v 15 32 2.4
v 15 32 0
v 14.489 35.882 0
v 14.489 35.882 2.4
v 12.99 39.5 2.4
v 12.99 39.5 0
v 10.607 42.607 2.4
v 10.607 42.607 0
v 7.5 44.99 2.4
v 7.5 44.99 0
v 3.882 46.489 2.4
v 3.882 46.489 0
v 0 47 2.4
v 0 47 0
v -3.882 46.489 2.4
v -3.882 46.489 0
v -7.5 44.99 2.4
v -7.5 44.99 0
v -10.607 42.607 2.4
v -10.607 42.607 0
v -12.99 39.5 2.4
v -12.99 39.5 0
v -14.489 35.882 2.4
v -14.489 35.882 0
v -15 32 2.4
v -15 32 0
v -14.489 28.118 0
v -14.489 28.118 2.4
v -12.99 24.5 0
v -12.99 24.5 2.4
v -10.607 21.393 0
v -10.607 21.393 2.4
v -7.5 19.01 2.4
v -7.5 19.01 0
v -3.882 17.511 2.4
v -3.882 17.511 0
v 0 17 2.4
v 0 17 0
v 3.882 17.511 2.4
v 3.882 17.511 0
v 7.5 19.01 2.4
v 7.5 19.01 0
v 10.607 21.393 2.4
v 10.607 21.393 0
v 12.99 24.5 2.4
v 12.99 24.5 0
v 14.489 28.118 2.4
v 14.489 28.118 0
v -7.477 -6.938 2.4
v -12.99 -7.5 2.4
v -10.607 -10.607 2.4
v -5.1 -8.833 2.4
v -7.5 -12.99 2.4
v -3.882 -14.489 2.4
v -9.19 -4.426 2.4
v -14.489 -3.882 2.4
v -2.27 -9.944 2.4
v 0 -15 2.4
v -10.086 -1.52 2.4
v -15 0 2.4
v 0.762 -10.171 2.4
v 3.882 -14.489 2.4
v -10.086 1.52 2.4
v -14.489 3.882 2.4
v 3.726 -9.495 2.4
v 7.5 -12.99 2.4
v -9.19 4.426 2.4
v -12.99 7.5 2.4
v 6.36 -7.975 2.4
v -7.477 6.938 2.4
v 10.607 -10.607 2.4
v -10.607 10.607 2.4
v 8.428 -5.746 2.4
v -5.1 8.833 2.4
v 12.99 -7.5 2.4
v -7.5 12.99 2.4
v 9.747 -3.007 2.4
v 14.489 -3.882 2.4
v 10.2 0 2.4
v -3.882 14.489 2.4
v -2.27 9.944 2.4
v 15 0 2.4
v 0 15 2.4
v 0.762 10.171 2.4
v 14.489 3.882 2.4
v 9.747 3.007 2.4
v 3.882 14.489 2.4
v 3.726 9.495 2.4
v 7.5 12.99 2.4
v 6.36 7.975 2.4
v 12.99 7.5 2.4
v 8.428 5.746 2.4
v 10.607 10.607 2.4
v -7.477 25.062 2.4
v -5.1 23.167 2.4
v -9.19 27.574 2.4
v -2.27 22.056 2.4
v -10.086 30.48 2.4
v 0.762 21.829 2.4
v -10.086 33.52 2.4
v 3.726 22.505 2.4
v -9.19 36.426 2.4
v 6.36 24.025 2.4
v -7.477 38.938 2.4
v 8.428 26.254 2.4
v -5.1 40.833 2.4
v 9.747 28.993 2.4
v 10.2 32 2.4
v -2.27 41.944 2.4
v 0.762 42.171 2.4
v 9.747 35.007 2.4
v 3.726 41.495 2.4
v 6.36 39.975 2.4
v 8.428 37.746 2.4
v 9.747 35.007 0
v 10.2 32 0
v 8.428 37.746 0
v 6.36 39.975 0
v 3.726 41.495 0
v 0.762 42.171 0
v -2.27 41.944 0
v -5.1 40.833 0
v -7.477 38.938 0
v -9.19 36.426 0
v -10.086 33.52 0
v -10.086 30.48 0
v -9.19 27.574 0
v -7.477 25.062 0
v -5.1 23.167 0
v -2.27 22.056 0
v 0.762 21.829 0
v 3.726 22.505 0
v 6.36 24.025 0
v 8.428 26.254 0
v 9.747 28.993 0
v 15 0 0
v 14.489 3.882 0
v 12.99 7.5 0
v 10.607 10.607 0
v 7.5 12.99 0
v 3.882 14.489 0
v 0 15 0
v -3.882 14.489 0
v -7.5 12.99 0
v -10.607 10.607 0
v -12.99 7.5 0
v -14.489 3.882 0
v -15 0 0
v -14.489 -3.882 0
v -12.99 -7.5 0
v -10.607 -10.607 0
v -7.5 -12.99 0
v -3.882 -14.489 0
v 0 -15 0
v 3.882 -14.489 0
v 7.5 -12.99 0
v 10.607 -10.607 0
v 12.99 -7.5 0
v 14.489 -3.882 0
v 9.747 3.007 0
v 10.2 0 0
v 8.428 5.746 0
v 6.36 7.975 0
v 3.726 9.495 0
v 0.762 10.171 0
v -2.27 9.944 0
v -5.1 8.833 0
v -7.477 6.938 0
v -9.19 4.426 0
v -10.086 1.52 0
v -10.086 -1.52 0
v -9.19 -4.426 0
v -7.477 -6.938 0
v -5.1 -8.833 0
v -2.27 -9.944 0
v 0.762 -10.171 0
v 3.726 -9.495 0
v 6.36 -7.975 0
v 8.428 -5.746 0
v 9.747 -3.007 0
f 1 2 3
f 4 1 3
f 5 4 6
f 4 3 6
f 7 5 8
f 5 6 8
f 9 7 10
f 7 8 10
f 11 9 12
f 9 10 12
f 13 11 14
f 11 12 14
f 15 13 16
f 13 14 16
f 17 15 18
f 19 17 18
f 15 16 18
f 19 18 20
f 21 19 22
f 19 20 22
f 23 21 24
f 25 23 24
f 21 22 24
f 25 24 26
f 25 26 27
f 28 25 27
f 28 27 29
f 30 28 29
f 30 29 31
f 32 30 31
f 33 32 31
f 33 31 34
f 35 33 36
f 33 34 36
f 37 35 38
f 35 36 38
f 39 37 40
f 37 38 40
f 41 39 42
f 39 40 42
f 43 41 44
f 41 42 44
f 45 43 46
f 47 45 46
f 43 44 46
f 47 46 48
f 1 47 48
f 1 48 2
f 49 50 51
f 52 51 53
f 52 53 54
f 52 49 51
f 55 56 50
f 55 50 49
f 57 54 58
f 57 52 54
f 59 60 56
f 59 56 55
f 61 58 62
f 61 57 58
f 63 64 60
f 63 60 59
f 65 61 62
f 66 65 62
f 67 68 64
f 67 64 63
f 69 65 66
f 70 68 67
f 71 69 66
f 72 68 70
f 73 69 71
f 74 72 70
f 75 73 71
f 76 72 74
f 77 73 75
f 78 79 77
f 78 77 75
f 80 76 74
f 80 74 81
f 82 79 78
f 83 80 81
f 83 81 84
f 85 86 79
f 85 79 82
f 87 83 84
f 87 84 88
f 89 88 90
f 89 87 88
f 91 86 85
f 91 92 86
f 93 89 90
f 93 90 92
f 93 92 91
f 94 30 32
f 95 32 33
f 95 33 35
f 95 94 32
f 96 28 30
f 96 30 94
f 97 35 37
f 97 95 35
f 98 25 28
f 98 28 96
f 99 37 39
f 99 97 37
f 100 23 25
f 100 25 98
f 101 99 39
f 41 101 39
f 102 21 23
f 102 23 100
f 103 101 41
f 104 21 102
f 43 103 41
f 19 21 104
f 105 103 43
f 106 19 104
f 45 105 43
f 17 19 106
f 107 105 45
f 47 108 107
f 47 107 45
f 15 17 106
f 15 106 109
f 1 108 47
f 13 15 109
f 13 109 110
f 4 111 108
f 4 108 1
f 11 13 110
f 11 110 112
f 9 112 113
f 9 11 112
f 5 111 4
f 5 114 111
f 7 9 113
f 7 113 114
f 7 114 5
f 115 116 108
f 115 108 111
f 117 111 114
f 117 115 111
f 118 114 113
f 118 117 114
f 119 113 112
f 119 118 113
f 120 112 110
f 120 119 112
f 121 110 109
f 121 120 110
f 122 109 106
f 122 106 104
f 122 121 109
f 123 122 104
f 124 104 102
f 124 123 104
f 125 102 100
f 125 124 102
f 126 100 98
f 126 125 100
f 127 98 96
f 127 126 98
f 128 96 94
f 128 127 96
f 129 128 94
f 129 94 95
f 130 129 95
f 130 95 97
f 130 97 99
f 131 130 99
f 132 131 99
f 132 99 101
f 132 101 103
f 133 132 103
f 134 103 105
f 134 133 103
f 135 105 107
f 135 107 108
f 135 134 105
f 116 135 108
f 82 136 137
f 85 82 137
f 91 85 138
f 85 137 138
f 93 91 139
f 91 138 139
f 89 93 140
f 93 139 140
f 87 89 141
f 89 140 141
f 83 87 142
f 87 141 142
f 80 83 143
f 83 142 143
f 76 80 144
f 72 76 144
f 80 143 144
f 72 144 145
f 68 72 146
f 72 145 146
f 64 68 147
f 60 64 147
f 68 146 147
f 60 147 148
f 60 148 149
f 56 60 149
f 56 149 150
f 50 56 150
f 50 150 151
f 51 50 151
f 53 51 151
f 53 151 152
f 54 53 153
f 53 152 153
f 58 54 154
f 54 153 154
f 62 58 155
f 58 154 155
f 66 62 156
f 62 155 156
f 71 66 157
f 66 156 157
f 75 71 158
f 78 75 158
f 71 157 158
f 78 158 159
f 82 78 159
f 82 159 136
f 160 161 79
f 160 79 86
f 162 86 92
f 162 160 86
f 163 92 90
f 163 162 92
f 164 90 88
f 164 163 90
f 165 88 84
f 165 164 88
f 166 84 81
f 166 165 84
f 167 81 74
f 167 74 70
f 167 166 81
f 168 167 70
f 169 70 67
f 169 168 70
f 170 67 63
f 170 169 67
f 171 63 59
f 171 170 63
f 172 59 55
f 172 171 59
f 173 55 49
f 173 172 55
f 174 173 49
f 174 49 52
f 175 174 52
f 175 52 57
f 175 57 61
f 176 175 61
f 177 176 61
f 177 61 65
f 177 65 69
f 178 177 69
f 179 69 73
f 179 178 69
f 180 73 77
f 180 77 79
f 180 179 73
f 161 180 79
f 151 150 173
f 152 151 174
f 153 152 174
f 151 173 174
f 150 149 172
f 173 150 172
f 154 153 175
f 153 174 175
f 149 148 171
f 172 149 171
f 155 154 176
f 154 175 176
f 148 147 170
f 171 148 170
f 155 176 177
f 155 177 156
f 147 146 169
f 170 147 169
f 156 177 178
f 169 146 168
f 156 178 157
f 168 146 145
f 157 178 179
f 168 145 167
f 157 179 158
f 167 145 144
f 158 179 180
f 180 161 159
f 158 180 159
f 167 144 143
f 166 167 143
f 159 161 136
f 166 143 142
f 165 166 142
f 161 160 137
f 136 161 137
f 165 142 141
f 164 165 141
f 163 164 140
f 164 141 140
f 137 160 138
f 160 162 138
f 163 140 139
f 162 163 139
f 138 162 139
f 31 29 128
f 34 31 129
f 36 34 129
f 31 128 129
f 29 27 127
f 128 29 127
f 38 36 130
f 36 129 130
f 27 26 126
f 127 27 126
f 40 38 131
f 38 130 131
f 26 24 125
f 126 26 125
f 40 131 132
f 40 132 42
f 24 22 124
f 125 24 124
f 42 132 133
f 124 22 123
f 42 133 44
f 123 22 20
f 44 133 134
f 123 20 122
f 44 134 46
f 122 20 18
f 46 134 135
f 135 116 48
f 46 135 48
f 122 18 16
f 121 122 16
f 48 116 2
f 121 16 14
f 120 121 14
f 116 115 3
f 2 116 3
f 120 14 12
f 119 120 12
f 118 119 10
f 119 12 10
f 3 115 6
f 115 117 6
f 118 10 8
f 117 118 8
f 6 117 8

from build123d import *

# Parameters (mm, degrees)
F0_R     = 15
F0_R_2   = 10.2
F1_DEPTH = 2.4


# Not quite as in the source:
# - a feature names something its author has since deleted; it is built from what else it names


with BuildPart() as f1:
    # F0 (on Top) → F1 (new body)
    with BuildSketch(Plane.XY):
        with Locations((0, 32)):
            Circle(F0_R)
        with Locations((0, 32)):
            Circle(F0_R_2, mode=Mode.SUBTRACT)
    extrude(amount=F1_DEPTH)


with BuildPart() as f1b:
    # F0 (on Top) → F1, piece 2 (new body)
    with BuildSketch(Plane.XY):
        Circle(F0_R)
        Circle(F0_R_2, mode=Mode.SUBTRACT)
    extrude(amount=F1_DEPTH)


solid = Compound([f1.part, f1b.part])
